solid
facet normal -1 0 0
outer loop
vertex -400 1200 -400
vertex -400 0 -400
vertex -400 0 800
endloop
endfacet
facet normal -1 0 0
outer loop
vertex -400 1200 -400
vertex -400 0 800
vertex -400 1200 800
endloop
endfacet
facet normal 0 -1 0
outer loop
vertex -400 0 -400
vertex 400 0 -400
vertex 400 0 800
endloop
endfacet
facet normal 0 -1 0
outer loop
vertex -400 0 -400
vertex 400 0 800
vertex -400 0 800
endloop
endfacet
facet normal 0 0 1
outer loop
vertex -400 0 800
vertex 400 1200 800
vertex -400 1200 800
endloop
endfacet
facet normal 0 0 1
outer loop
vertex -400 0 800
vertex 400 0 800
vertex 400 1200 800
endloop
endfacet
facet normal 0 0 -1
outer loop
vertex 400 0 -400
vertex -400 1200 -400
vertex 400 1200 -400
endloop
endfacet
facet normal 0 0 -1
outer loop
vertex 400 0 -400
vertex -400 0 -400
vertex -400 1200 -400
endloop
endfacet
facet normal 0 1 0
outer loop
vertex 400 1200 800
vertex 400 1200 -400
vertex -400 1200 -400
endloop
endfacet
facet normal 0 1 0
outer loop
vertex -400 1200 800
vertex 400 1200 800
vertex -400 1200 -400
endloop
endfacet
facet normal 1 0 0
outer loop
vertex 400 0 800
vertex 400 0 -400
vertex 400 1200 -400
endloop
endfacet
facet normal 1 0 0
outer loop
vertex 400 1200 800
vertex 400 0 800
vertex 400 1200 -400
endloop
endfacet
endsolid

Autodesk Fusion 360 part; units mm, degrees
sketch "Esquisse1" plane through (0, 0, 0) normal (0, 1, 0) x (1, 0, 0)
  line L0 (-400, 400) -> (400, 400)
  line L1 (400, 400) -> (400, -400)
  line L2 (400, -400) -> (-400, -400)
  line L3 (-400, -400) -> (-400, 400)
  line L4 (-400, 400) -> (400, -400) construction
  line L5 (400, 400) -> (-400, -400) construction
  dimension "d1" = 800
  dimension "d2" = 800
extrude "Extrusion1" add sketch "Esquisse1" along normal blind 1200
extrude "Extrusion2" add 1 faces at (133.3333, 400, 400) along direction (0, 0, 1) blind 200
extrude "Extrusion3" add 1 faces at (133.3333, 400, 600) along direction (0, 0, 1) blind 200
sketch "Esquisse2" plane through (0, 1200, 0) normal (0, 1, 0) x (-1, 0, 0)
  line L0 (-400, 800) -> (-400, -400)
  line L1 (-400, -400) -> (400, -400)
  line L2 (400, -400) -> (400, 800)
  line L3 (400, 800) -> (-400, 800)
